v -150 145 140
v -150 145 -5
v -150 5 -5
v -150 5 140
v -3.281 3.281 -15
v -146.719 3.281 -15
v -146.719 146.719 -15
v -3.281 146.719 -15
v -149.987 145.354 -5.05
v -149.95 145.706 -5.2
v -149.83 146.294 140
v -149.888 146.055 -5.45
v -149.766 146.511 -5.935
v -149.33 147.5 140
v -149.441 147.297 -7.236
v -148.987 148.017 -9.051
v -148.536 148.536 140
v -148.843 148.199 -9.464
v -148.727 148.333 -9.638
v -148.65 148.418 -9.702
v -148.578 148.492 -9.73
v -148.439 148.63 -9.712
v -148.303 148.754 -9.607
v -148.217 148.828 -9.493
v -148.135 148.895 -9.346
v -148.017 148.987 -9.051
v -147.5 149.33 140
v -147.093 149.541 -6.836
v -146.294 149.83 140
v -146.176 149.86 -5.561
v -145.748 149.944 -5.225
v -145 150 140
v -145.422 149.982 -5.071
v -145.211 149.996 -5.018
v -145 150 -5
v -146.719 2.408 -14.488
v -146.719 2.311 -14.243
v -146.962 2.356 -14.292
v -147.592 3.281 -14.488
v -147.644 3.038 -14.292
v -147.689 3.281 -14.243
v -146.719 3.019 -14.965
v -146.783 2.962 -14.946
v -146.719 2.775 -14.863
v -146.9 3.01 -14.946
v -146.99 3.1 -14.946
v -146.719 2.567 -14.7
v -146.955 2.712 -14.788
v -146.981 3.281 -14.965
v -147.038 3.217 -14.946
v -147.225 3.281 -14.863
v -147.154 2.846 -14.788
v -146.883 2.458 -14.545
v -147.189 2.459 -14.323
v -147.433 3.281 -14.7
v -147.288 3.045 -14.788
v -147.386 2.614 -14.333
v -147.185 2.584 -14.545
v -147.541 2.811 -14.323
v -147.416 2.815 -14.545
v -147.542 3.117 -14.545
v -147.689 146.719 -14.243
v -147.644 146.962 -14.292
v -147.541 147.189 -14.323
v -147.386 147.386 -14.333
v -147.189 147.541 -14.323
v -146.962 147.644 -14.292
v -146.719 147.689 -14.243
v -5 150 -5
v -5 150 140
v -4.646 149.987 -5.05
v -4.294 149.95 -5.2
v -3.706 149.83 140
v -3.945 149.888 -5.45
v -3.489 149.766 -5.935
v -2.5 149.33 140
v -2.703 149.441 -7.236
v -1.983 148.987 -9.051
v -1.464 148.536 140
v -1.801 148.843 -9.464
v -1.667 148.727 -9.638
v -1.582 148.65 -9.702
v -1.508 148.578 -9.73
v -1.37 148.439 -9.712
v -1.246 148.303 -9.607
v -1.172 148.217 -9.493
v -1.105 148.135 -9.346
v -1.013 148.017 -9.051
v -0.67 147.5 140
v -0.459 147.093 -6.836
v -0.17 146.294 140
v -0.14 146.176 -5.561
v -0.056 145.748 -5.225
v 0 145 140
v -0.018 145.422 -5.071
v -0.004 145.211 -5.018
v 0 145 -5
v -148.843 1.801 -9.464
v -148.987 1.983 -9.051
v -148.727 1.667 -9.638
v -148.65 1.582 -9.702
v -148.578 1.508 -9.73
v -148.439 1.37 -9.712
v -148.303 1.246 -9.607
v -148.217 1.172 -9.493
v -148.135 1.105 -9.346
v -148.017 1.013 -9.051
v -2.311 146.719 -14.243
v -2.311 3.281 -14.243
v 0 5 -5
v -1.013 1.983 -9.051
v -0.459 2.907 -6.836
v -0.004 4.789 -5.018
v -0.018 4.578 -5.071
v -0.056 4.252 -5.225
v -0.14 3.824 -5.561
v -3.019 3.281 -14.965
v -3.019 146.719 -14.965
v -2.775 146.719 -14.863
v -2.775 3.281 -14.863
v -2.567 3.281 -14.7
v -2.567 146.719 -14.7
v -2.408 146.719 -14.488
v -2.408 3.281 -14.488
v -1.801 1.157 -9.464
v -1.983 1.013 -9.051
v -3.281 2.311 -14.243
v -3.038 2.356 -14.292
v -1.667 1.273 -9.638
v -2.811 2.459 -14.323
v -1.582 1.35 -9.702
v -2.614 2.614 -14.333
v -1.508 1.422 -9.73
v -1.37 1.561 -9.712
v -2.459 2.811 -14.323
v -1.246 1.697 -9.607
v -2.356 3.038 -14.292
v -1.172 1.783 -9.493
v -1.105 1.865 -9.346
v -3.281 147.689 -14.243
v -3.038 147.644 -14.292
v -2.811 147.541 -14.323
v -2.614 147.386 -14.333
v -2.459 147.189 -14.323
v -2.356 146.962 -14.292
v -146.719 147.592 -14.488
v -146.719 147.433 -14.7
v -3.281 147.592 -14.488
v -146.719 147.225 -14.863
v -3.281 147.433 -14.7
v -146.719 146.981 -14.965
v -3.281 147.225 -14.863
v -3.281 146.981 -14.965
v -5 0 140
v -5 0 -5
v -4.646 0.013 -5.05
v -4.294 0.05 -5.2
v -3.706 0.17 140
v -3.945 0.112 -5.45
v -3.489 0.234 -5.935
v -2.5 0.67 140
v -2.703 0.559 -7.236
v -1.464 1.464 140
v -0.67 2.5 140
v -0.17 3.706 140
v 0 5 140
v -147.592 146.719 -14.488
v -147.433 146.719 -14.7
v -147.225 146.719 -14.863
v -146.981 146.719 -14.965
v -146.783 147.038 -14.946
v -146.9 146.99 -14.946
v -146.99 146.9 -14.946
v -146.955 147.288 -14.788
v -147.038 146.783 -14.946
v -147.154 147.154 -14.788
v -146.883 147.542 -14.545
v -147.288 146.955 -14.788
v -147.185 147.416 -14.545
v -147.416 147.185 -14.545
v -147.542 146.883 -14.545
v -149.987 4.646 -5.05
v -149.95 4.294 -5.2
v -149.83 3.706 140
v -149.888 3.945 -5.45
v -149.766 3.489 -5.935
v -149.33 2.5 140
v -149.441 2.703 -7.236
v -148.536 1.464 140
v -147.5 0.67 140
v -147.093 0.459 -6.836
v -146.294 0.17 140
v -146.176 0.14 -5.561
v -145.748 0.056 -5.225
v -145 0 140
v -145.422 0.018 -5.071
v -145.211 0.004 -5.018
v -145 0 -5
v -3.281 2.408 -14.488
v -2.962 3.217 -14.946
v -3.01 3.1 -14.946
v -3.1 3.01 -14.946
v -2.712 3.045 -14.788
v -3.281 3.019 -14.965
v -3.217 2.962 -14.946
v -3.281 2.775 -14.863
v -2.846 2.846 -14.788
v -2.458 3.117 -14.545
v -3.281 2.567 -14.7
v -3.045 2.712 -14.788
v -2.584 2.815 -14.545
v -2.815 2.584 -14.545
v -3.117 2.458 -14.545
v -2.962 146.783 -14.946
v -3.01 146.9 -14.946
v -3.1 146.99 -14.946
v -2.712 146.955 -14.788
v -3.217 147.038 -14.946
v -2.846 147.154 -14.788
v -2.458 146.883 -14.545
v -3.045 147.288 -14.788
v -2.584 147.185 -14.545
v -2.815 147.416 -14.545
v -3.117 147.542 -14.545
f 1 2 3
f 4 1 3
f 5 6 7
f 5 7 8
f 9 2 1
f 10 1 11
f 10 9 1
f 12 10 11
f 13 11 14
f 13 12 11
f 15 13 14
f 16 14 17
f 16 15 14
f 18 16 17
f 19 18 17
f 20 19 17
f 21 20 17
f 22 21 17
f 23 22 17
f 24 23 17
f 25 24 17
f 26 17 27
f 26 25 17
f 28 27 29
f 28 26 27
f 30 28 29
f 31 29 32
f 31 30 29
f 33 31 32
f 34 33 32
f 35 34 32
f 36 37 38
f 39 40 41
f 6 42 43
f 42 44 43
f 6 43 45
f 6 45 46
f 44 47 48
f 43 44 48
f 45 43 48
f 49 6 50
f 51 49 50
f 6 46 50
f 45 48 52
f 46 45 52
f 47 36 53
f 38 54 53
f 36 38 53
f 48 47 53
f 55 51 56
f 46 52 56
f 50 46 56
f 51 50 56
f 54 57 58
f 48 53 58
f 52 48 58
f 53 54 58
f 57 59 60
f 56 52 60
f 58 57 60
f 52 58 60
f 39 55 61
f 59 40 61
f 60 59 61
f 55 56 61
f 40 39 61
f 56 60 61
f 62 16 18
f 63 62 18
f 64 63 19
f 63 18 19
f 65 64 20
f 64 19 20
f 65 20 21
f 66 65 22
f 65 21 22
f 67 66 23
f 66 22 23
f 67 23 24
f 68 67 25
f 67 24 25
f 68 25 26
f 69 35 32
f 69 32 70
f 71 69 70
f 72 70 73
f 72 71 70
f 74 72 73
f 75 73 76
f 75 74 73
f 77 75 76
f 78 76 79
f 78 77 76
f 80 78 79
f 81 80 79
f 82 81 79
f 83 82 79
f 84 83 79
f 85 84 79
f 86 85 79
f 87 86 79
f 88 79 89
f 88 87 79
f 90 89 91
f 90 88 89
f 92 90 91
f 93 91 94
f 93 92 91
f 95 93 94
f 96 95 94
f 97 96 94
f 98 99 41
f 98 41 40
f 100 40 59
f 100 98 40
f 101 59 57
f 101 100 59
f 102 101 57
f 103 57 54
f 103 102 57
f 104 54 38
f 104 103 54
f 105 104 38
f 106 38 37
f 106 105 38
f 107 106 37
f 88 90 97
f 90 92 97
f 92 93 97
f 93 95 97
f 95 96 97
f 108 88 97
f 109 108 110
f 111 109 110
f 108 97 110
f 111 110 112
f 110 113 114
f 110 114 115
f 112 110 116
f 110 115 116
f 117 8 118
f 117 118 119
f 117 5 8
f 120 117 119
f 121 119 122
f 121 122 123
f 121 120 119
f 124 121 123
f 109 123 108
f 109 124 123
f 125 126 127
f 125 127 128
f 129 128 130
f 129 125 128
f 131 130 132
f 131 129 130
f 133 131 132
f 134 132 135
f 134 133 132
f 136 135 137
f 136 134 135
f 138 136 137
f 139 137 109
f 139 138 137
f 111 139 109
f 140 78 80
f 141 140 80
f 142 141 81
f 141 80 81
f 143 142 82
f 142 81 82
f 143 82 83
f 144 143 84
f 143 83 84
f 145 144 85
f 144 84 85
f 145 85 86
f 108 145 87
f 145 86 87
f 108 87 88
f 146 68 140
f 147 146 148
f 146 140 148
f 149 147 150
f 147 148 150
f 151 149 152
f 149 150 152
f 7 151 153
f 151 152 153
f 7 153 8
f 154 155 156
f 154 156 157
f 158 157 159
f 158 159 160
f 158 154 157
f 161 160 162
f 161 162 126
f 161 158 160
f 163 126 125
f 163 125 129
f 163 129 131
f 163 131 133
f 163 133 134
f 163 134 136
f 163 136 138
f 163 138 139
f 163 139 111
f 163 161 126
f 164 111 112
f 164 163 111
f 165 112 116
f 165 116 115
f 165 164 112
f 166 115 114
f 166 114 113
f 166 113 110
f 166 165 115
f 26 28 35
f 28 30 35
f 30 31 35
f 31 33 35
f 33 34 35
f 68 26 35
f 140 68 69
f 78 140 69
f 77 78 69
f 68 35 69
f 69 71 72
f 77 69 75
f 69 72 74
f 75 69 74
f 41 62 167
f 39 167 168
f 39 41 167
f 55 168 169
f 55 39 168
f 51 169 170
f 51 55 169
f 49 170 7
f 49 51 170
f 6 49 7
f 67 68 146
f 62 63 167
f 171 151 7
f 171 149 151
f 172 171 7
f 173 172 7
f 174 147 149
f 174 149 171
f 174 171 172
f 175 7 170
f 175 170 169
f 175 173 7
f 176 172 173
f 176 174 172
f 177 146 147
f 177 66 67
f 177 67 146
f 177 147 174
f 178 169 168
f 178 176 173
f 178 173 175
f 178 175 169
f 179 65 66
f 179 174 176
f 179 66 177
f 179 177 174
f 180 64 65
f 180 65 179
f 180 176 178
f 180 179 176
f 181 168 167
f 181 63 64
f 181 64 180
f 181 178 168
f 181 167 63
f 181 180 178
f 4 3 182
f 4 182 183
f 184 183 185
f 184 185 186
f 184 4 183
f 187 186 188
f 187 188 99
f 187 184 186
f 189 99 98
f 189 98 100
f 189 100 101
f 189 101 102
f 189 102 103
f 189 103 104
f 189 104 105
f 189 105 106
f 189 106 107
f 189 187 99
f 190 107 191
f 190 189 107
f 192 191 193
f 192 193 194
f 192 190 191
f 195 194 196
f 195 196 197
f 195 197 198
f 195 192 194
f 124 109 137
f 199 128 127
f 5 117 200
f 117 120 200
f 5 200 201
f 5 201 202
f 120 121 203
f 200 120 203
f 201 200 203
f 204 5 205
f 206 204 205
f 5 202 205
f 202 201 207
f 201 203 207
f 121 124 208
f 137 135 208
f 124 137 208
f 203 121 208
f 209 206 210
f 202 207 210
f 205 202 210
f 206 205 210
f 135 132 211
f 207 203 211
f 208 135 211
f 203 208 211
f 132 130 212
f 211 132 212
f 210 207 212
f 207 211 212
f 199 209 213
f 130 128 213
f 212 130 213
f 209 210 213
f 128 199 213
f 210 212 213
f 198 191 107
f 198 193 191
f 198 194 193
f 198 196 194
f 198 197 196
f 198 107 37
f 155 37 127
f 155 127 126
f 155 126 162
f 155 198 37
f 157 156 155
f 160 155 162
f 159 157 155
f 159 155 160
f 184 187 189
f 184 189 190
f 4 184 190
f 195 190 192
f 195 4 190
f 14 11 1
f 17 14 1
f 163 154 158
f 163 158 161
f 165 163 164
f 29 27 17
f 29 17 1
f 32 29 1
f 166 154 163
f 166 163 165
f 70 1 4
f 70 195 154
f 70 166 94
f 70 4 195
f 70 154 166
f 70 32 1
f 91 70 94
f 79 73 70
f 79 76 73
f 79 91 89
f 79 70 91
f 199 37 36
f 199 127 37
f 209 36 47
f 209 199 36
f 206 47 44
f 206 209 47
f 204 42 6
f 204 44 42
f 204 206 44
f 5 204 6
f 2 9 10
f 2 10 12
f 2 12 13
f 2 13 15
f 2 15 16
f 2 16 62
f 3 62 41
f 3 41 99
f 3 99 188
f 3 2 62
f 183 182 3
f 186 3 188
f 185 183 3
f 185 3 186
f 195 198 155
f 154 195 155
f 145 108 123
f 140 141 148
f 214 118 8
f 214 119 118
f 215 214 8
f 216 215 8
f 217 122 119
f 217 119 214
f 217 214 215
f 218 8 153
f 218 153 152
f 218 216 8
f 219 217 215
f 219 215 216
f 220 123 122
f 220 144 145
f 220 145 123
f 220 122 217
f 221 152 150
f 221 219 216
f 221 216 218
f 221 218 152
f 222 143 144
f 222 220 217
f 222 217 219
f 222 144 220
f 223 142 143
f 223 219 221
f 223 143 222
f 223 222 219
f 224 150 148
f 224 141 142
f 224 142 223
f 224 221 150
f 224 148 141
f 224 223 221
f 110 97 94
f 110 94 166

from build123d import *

# Parameters (mm, degrees)
F0_W     = 150
F0_H     = 150
F1_DEPTH = 140
F2_W     = 150
F2_H     = 150
F3_DEPTH = 15
F4_SIZE2 = 10
F4_SIZE  = 2.5
F5_R     = 1
F6_R     = 5


with BuildPart() as f1:
    # F0 (on Top) → F1 (new body)
    with BuildSketch(Plane.XY):
        with Locations((-75, 75)):
            Rectangle(F0_W, F0_H)
    extrude(amount=F1_DEPTH)

    # F2 (on face) → F3 (join)
    with BuildSketch(Plane(origin=(0, 0, 0), x_dir=(1, 0, 0), z_dir=(0, 0, -1))):
        with Locations((-75, -75)):
            Rectangle(F2_W, F2_H)
    extrude(amount=F3_DEPTH)

    # F4
    f4_edges = [f1.edges().sort_by_distance(p)[0] for p in [
        (0, 75, -15),
        (-75, 0, -15),
        (-150, 75, -15),
        (-75, 150, -15),
    ]]
    f4_side = f1.faces().sort_by_distance((-75, 75, -15))[0]
    chamfer(f4_edges, length=F4_SIZE, length2=F4_SIZE2, reference=f4_side)

    # F5
    f5_edges = [f1.edges().sort_by_distance(p)[0] for p in [
        (-1.25, 1.25, -10),
        (-148.75, 1.25, -10),
        (-148.75, 148.75, -10),
        (-1.25, 148.75, -10),
        (-2.5, 75, -15),
        (-75, 147.5, -15),
        (-75, 2.5, -15),
        (-147.5, 75, -15),
    ]]
    fillet(f5_edges, radius=F5_R)

    # F6
    f6_edges = [f1.edges().sort_by_distance(p)[0] for p in [
        (0, 0, 68.061553),
        (-150, 0, 68.061553),
        (-150, 150, 68.061553),
        (0, 150, 68.061553),
    ]]
    fillet(f6_edges, radius=F6_R)


solid = f1.part
